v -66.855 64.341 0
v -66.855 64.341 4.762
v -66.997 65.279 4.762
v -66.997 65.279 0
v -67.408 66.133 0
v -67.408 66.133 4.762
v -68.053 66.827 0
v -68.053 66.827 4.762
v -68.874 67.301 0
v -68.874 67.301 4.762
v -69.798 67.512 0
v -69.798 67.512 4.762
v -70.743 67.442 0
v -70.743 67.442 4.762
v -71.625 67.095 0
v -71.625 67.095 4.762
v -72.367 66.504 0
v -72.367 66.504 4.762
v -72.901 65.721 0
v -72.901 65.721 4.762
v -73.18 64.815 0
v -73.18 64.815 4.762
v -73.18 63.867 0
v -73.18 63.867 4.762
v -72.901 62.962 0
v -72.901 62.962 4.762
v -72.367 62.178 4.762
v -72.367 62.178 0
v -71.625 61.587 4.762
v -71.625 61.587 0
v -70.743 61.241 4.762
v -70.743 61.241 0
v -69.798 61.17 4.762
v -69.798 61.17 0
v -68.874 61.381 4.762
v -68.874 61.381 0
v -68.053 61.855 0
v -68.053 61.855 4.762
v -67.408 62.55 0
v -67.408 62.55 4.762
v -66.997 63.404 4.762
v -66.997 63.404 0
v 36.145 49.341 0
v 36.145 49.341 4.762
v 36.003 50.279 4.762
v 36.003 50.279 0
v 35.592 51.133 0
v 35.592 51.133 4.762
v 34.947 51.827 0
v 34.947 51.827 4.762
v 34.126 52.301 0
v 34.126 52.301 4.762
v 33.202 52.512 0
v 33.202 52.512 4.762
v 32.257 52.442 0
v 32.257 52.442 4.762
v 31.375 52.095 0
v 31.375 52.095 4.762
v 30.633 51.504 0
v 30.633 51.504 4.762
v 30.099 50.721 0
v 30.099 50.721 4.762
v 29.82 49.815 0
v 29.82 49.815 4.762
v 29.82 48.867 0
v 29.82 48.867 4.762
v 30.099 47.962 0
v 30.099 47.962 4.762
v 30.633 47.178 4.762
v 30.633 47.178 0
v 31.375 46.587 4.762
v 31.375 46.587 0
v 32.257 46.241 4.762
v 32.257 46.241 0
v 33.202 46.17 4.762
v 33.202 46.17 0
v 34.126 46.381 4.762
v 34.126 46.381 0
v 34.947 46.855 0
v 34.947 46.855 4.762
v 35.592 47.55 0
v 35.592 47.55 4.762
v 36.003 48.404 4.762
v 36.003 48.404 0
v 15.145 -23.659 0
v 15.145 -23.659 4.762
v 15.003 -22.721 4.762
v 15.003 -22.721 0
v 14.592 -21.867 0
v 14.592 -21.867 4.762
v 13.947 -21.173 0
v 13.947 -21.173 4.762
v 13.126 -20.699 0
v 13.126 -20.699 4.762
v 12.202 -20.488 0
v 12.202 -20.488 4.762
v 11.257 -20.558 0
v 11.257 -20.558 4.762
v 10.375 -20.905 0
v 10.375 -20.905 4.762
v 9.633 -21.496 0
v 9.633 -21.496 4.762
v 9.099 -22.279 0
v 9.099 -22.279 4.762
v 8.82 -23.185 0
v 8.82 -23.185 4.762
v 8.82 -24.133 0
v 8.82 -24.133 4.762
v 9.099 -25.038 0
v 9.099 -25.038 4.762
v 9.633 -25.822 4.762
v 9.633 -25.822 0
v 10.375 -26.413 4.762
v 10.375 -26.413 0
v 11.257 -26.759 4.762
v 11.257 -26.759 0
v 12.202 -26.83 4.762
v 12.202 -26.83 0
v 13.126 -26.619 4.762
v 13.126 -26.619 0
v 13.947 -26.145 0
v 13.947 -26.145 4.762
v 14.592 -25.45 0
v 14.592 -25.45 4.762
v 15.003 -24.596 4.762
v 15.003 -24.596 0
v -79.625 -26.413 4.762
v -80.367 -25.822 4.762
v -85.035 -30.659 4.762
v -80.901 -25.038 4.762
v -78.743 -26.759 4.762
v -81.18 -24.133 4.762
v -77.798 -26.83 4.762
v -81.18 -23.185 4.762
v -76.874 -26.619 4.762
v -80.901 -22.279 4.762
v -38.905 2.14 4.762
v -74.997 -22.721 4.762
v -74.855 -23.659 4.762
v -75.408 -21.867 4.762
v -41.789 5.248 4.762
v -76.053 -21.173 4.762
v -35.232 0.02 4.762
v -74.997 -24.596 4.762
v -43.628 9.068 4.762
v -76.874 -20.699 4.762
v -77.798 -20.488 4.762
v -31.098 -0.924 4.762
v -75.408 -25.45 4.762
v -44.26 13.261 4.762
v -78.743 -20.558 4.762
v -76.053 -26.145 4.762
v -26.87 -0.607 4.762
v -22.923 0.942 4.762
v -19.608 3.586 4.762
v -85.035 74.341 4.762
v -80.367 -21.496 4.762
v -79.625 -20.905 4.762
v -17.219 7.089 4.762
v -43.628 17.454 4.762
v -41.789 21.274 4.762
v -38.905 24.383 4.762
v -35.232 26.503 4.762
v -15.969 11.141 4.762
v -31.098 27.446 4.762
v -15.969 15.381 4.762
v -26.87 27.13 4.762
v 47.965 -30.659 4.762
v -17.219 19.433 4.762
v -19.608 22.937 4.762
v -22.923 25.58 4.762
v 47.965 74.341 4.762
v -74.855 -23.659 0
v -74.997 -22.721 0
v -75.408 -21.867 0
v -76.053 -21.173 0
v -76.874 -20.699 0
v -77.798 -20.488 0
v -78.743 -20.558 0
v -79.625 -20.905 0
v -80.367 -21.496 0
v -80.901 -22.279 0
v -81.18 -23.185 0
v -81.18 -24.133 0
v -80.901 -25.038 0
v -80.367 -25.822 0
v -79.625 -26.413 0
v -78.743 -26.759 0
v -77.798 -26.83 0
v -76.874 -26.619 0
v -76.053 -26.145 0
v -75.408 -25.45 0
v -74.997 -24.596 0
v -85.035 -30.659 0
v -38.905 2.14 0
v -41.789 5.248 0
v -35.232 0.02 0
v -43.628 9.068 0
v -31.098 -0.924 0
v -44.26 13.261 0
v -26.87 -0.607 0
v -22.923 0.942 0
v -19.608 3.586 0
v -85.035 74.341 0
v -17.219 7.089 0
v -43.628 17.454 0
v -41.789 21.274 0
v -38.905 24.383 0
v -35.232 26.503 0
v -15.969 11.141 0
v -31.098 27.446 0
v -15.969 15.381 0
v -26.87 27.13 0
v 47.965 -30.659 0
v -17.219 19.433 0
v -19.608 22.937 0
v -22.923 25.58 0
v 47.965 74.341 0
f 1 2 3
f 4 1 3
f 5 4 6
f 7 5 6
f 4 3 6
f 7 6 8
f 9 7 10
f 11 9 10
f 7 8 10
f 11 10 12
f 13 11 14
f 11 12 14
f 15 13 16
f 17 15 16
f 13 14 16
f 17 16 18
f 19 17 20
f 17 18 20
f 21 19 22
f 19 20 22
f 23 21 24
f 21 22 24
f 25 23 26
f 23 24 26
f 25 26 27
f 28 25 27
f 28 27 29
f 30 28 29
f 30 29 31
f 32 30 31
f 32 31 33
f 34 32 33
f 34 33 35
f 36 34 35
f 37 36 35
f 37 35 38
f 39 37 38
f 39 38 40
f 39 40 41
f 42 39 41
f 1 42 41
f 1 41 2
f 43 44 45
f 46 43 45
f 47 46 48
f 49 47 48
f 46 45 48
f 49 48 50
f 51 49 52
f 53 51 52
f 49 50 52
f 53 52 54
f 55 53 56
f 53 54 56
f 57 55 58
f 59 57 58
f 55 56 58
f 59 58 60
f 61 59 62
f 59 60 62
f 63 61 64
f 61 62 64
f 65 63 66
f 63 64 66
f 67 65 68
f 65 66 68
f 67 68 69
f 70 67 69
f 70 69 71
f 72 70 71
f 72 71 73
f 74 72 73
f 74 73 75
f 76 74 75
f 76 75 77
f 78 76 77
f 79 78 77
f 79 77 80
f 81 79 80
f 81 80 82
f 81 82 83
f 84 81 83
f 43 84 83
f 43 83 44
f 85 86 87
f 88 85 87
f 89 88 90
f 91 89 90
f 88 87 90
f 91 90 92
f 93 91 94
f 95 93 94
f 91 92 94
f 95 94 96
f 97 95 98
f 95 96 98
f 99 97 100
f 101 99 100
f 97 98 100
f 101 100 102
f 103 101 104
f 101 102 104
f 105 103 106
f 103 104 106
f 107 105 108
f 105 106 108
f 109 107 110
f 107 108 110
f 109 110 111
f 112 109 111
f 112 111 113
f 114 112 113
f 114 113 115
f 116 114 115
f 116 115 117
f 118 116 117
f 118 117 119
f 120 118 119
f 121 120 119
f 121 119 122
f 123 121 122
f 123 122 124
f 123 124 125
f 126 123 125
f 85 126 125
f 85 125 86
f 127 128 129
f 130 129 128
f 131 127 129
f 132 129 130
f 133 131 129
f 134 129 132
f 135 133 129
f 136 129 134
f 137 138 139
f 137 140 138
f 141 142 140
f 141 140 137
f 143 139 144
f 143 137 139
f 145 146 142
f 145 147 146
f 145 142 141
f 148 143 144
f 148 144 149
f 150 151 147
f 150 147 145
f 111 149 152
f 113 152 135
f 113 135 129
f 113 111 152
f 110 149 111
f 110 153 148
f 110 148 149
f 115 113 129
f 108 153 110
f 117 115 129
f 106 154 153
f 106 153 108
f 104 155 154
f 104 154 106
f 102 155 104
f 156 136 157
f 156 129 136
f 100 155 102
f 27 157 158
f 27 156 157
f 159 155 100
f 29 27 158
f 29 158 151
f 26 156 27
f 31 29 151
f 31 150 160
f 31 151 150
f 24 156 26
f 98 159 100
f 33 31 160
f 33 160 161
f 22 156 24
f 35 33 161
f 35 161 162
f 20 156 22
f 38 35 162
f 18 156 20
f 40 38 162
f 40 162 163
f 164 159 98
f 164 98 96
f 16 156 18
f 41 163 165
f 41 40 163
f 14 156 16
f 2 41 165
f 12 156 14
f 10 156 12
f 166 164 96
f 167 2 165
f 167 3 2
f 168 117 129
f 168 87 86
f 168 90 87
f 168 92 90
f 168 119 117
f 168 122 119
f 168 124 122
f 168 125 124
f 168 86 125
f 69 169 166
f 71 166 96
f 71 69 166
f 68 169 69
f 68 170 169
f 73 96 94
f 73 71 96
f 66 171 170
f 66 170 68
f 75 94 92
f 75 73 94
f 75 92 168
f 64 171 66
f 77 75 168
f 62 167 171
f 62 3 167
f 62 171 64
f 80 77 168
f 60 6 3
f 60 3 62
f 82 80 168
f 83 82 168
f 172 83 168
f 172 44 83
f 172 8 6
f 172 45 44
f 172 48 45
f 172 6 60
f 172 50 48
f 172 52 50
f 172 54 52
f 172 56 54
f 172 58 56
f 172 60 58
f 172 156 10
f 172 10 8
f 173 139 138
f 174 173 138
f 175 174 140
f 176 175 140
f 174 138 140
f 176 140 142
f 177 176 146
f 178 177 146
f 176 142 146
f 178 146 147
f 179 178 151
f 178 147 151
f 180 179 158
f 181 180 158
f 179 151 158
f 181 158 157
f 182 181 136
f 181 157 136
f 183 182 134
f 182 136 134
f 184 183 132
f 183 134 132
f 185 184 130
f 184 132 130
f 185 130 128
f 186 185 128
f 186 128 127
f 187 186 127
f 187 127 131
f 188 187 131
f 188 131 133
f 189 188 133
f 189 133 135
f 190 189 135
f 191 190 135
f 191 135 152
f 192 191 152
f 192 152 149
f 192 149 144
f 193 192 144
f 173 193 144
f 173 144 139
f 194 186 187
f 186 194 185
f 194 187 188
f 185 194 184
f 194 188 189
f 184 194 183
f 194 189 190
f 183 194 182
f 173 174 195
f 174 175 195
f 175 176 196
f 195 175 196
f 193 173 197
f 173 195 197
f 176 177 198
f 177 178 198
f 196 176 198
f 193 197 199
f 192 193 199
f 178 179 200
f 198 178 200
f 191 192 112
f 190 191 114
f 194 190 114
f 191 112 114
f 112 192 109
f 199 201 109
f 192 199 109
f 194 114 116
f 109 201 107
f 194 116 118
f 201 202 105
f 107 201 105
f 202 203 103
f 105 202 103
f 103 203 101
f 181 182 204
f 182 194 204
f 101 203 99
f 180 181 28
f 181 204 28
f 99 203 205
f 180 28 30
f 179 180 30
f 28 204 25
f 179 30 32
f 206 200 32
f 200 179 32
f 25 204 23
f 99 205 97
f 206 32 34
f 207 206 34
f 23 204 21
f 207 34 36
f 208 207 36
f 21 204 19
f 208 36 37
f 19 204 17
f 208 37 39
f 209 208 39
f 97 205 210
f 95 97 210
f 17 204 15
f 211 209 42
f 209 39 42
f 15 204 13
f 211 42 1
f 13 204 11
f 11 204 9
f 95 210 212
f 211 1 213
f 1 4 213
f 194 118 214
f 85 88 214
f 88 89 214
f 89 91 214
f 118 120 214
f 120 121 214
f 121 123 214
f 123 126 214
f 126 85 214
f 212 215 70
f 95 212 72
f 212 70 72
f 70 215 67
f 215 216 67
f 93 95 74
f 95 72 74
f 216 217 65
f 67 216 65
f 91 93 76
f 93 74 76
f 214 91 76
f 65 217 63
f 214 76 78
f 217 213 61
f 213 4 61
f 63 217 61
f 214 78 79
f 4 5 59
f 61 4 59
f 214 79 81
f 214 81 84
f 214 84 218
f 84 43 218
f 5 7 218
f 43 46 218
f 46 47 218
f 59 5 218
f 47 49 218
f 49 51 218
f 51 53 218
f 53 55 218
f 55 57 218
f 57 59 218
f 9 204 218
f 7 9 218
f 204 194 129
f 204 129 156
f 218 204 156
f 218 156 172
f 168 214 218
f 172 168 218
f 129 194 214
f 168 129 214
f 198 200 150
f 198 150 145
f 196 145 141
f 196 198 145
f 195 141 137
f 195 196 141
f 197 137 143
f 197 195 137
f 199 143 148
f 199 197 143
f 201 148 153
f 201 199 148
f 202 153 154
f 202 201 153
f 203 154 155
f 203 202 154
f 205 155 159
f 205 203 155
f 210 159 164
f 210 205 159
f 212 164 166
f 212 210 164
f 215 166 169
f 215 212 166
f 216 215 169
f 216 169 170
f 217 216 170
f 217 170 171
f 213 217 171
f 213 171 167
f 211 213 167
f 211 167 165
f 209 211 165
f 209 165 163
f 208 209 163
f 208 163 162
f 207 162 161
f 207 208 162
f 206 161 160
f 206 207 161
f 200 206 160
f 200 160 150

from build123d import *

# Parameters (mm, degrees)
SKETCH1_W           = 133
SKETCH1_H           = 105
SKETCH1_R           = 14.225
BOSS_EXTRUDE2_DEPTH = 4.7625
CUT_EXTRUDE1_REACH  = 115.05
SKETCH2_R           = 3.18


with BuildPart() as part:
    # Sketch1 → Boss-Extrude2 (new body)
    with BuildSketch(Plane.XY):
        with Locations((-18.535460993, 21.841271178)):
            Rectangle(SKETCH1_W, SKETCH1_H)
        with Locations(Location((-30.035460993, 13.261258957, 0), (0, 0, 180))):
            Circle(SKETCH1_R, mode=Mode.SUBTRACT)
    extrude(amount=BOSS_EXTRUDE2_DEPTH)

    # Sketch2 → Cut-Extrude1 (cut, up to next)
    with BuildSketch(Plane.XY.offset(4.7625), mode=Mode.PRIVATE) as cut_extrude1_sk1:
        with Locations((-70.035460993, 64.341271178)):
            Circle(SKETCH2_R)
    cut_extrude1_tool1 = extrude(cut_extrude1_sk1.sketch, amount=-CUT_EXTRUDE1_REACH, mode=Mode.PRIVATE) & part.part
    # Sketch2 → Cut-Extrude1 (cut, up to next)
    with BuildSketch(Plane.XY.offset(4.7625), mode=Mode.PRIVATE) as cut_extrude1_sk2:
        with Locations((32.964539007, 49.341271178)):
            Circle(SKETCH2_R)
    cut_extrude1_tool2 = extrude(cut_extrude1_sk2.sketch, amount=-CUT_EXTRUDE1_REACH, mode=Mode.PRIVATE) & part.part
    # Sketch2 → Cut-Extrude1 (cut, up to next)
    with BuildSketch(Plane.XY.offset(4.7625), mode=Mode.PRIVATE) as cut_extrude1_sk3:
        with Locations((11.964539007, -23.658728822)):
            Circle(SKETCH2_R)
    cut_extrude1_tool3 = extrude(cut_extrude1_sk3.sketch, amount=-CUT_EXTRUDE1_REACH, mode=Mode.PRIVATE) & part.part
    # Sketch2 → Cut-Extrude1 (cut, up to next)
    with BuildSketch(Plane.XY.offset(4.7625), mode=Mode.PRIVATE) as cut_extrude1_sk4:
        with Locations((-78.035460993, -23.658728822)):
            Circle(SKETCH2_R)
    cut_extrude1_tool4 = extrude(cut_extrude1_sk4.sketch, amount=-CUT_EXTRUDE1_REACH, mode=Mode.PRIVATE) & part.part
    add(cut_extrude1_tool1.solids().sort_by_distance((-70.035461, 64.341271, 4.7625))[0], mode=Mode.SUBTRACT)
    add(cut_extrude1_tool2.solids().sort_by_distance((32.964539, 49.341271, 4.7625))[0], mode=Mode.SUBTRACT)
    add(cut_extrude1_tool3.solids().sort_by_distance((11.964539, -23.658729, 4.7625))[0], mode=Mode.SUBTRACT)
    add(cut_extrude1_tool4.solids().sort_by_distance((-78.035461, -23.658729, 4.7625))[0], mode=Mode.SUBTRACT)


solid = part.part
